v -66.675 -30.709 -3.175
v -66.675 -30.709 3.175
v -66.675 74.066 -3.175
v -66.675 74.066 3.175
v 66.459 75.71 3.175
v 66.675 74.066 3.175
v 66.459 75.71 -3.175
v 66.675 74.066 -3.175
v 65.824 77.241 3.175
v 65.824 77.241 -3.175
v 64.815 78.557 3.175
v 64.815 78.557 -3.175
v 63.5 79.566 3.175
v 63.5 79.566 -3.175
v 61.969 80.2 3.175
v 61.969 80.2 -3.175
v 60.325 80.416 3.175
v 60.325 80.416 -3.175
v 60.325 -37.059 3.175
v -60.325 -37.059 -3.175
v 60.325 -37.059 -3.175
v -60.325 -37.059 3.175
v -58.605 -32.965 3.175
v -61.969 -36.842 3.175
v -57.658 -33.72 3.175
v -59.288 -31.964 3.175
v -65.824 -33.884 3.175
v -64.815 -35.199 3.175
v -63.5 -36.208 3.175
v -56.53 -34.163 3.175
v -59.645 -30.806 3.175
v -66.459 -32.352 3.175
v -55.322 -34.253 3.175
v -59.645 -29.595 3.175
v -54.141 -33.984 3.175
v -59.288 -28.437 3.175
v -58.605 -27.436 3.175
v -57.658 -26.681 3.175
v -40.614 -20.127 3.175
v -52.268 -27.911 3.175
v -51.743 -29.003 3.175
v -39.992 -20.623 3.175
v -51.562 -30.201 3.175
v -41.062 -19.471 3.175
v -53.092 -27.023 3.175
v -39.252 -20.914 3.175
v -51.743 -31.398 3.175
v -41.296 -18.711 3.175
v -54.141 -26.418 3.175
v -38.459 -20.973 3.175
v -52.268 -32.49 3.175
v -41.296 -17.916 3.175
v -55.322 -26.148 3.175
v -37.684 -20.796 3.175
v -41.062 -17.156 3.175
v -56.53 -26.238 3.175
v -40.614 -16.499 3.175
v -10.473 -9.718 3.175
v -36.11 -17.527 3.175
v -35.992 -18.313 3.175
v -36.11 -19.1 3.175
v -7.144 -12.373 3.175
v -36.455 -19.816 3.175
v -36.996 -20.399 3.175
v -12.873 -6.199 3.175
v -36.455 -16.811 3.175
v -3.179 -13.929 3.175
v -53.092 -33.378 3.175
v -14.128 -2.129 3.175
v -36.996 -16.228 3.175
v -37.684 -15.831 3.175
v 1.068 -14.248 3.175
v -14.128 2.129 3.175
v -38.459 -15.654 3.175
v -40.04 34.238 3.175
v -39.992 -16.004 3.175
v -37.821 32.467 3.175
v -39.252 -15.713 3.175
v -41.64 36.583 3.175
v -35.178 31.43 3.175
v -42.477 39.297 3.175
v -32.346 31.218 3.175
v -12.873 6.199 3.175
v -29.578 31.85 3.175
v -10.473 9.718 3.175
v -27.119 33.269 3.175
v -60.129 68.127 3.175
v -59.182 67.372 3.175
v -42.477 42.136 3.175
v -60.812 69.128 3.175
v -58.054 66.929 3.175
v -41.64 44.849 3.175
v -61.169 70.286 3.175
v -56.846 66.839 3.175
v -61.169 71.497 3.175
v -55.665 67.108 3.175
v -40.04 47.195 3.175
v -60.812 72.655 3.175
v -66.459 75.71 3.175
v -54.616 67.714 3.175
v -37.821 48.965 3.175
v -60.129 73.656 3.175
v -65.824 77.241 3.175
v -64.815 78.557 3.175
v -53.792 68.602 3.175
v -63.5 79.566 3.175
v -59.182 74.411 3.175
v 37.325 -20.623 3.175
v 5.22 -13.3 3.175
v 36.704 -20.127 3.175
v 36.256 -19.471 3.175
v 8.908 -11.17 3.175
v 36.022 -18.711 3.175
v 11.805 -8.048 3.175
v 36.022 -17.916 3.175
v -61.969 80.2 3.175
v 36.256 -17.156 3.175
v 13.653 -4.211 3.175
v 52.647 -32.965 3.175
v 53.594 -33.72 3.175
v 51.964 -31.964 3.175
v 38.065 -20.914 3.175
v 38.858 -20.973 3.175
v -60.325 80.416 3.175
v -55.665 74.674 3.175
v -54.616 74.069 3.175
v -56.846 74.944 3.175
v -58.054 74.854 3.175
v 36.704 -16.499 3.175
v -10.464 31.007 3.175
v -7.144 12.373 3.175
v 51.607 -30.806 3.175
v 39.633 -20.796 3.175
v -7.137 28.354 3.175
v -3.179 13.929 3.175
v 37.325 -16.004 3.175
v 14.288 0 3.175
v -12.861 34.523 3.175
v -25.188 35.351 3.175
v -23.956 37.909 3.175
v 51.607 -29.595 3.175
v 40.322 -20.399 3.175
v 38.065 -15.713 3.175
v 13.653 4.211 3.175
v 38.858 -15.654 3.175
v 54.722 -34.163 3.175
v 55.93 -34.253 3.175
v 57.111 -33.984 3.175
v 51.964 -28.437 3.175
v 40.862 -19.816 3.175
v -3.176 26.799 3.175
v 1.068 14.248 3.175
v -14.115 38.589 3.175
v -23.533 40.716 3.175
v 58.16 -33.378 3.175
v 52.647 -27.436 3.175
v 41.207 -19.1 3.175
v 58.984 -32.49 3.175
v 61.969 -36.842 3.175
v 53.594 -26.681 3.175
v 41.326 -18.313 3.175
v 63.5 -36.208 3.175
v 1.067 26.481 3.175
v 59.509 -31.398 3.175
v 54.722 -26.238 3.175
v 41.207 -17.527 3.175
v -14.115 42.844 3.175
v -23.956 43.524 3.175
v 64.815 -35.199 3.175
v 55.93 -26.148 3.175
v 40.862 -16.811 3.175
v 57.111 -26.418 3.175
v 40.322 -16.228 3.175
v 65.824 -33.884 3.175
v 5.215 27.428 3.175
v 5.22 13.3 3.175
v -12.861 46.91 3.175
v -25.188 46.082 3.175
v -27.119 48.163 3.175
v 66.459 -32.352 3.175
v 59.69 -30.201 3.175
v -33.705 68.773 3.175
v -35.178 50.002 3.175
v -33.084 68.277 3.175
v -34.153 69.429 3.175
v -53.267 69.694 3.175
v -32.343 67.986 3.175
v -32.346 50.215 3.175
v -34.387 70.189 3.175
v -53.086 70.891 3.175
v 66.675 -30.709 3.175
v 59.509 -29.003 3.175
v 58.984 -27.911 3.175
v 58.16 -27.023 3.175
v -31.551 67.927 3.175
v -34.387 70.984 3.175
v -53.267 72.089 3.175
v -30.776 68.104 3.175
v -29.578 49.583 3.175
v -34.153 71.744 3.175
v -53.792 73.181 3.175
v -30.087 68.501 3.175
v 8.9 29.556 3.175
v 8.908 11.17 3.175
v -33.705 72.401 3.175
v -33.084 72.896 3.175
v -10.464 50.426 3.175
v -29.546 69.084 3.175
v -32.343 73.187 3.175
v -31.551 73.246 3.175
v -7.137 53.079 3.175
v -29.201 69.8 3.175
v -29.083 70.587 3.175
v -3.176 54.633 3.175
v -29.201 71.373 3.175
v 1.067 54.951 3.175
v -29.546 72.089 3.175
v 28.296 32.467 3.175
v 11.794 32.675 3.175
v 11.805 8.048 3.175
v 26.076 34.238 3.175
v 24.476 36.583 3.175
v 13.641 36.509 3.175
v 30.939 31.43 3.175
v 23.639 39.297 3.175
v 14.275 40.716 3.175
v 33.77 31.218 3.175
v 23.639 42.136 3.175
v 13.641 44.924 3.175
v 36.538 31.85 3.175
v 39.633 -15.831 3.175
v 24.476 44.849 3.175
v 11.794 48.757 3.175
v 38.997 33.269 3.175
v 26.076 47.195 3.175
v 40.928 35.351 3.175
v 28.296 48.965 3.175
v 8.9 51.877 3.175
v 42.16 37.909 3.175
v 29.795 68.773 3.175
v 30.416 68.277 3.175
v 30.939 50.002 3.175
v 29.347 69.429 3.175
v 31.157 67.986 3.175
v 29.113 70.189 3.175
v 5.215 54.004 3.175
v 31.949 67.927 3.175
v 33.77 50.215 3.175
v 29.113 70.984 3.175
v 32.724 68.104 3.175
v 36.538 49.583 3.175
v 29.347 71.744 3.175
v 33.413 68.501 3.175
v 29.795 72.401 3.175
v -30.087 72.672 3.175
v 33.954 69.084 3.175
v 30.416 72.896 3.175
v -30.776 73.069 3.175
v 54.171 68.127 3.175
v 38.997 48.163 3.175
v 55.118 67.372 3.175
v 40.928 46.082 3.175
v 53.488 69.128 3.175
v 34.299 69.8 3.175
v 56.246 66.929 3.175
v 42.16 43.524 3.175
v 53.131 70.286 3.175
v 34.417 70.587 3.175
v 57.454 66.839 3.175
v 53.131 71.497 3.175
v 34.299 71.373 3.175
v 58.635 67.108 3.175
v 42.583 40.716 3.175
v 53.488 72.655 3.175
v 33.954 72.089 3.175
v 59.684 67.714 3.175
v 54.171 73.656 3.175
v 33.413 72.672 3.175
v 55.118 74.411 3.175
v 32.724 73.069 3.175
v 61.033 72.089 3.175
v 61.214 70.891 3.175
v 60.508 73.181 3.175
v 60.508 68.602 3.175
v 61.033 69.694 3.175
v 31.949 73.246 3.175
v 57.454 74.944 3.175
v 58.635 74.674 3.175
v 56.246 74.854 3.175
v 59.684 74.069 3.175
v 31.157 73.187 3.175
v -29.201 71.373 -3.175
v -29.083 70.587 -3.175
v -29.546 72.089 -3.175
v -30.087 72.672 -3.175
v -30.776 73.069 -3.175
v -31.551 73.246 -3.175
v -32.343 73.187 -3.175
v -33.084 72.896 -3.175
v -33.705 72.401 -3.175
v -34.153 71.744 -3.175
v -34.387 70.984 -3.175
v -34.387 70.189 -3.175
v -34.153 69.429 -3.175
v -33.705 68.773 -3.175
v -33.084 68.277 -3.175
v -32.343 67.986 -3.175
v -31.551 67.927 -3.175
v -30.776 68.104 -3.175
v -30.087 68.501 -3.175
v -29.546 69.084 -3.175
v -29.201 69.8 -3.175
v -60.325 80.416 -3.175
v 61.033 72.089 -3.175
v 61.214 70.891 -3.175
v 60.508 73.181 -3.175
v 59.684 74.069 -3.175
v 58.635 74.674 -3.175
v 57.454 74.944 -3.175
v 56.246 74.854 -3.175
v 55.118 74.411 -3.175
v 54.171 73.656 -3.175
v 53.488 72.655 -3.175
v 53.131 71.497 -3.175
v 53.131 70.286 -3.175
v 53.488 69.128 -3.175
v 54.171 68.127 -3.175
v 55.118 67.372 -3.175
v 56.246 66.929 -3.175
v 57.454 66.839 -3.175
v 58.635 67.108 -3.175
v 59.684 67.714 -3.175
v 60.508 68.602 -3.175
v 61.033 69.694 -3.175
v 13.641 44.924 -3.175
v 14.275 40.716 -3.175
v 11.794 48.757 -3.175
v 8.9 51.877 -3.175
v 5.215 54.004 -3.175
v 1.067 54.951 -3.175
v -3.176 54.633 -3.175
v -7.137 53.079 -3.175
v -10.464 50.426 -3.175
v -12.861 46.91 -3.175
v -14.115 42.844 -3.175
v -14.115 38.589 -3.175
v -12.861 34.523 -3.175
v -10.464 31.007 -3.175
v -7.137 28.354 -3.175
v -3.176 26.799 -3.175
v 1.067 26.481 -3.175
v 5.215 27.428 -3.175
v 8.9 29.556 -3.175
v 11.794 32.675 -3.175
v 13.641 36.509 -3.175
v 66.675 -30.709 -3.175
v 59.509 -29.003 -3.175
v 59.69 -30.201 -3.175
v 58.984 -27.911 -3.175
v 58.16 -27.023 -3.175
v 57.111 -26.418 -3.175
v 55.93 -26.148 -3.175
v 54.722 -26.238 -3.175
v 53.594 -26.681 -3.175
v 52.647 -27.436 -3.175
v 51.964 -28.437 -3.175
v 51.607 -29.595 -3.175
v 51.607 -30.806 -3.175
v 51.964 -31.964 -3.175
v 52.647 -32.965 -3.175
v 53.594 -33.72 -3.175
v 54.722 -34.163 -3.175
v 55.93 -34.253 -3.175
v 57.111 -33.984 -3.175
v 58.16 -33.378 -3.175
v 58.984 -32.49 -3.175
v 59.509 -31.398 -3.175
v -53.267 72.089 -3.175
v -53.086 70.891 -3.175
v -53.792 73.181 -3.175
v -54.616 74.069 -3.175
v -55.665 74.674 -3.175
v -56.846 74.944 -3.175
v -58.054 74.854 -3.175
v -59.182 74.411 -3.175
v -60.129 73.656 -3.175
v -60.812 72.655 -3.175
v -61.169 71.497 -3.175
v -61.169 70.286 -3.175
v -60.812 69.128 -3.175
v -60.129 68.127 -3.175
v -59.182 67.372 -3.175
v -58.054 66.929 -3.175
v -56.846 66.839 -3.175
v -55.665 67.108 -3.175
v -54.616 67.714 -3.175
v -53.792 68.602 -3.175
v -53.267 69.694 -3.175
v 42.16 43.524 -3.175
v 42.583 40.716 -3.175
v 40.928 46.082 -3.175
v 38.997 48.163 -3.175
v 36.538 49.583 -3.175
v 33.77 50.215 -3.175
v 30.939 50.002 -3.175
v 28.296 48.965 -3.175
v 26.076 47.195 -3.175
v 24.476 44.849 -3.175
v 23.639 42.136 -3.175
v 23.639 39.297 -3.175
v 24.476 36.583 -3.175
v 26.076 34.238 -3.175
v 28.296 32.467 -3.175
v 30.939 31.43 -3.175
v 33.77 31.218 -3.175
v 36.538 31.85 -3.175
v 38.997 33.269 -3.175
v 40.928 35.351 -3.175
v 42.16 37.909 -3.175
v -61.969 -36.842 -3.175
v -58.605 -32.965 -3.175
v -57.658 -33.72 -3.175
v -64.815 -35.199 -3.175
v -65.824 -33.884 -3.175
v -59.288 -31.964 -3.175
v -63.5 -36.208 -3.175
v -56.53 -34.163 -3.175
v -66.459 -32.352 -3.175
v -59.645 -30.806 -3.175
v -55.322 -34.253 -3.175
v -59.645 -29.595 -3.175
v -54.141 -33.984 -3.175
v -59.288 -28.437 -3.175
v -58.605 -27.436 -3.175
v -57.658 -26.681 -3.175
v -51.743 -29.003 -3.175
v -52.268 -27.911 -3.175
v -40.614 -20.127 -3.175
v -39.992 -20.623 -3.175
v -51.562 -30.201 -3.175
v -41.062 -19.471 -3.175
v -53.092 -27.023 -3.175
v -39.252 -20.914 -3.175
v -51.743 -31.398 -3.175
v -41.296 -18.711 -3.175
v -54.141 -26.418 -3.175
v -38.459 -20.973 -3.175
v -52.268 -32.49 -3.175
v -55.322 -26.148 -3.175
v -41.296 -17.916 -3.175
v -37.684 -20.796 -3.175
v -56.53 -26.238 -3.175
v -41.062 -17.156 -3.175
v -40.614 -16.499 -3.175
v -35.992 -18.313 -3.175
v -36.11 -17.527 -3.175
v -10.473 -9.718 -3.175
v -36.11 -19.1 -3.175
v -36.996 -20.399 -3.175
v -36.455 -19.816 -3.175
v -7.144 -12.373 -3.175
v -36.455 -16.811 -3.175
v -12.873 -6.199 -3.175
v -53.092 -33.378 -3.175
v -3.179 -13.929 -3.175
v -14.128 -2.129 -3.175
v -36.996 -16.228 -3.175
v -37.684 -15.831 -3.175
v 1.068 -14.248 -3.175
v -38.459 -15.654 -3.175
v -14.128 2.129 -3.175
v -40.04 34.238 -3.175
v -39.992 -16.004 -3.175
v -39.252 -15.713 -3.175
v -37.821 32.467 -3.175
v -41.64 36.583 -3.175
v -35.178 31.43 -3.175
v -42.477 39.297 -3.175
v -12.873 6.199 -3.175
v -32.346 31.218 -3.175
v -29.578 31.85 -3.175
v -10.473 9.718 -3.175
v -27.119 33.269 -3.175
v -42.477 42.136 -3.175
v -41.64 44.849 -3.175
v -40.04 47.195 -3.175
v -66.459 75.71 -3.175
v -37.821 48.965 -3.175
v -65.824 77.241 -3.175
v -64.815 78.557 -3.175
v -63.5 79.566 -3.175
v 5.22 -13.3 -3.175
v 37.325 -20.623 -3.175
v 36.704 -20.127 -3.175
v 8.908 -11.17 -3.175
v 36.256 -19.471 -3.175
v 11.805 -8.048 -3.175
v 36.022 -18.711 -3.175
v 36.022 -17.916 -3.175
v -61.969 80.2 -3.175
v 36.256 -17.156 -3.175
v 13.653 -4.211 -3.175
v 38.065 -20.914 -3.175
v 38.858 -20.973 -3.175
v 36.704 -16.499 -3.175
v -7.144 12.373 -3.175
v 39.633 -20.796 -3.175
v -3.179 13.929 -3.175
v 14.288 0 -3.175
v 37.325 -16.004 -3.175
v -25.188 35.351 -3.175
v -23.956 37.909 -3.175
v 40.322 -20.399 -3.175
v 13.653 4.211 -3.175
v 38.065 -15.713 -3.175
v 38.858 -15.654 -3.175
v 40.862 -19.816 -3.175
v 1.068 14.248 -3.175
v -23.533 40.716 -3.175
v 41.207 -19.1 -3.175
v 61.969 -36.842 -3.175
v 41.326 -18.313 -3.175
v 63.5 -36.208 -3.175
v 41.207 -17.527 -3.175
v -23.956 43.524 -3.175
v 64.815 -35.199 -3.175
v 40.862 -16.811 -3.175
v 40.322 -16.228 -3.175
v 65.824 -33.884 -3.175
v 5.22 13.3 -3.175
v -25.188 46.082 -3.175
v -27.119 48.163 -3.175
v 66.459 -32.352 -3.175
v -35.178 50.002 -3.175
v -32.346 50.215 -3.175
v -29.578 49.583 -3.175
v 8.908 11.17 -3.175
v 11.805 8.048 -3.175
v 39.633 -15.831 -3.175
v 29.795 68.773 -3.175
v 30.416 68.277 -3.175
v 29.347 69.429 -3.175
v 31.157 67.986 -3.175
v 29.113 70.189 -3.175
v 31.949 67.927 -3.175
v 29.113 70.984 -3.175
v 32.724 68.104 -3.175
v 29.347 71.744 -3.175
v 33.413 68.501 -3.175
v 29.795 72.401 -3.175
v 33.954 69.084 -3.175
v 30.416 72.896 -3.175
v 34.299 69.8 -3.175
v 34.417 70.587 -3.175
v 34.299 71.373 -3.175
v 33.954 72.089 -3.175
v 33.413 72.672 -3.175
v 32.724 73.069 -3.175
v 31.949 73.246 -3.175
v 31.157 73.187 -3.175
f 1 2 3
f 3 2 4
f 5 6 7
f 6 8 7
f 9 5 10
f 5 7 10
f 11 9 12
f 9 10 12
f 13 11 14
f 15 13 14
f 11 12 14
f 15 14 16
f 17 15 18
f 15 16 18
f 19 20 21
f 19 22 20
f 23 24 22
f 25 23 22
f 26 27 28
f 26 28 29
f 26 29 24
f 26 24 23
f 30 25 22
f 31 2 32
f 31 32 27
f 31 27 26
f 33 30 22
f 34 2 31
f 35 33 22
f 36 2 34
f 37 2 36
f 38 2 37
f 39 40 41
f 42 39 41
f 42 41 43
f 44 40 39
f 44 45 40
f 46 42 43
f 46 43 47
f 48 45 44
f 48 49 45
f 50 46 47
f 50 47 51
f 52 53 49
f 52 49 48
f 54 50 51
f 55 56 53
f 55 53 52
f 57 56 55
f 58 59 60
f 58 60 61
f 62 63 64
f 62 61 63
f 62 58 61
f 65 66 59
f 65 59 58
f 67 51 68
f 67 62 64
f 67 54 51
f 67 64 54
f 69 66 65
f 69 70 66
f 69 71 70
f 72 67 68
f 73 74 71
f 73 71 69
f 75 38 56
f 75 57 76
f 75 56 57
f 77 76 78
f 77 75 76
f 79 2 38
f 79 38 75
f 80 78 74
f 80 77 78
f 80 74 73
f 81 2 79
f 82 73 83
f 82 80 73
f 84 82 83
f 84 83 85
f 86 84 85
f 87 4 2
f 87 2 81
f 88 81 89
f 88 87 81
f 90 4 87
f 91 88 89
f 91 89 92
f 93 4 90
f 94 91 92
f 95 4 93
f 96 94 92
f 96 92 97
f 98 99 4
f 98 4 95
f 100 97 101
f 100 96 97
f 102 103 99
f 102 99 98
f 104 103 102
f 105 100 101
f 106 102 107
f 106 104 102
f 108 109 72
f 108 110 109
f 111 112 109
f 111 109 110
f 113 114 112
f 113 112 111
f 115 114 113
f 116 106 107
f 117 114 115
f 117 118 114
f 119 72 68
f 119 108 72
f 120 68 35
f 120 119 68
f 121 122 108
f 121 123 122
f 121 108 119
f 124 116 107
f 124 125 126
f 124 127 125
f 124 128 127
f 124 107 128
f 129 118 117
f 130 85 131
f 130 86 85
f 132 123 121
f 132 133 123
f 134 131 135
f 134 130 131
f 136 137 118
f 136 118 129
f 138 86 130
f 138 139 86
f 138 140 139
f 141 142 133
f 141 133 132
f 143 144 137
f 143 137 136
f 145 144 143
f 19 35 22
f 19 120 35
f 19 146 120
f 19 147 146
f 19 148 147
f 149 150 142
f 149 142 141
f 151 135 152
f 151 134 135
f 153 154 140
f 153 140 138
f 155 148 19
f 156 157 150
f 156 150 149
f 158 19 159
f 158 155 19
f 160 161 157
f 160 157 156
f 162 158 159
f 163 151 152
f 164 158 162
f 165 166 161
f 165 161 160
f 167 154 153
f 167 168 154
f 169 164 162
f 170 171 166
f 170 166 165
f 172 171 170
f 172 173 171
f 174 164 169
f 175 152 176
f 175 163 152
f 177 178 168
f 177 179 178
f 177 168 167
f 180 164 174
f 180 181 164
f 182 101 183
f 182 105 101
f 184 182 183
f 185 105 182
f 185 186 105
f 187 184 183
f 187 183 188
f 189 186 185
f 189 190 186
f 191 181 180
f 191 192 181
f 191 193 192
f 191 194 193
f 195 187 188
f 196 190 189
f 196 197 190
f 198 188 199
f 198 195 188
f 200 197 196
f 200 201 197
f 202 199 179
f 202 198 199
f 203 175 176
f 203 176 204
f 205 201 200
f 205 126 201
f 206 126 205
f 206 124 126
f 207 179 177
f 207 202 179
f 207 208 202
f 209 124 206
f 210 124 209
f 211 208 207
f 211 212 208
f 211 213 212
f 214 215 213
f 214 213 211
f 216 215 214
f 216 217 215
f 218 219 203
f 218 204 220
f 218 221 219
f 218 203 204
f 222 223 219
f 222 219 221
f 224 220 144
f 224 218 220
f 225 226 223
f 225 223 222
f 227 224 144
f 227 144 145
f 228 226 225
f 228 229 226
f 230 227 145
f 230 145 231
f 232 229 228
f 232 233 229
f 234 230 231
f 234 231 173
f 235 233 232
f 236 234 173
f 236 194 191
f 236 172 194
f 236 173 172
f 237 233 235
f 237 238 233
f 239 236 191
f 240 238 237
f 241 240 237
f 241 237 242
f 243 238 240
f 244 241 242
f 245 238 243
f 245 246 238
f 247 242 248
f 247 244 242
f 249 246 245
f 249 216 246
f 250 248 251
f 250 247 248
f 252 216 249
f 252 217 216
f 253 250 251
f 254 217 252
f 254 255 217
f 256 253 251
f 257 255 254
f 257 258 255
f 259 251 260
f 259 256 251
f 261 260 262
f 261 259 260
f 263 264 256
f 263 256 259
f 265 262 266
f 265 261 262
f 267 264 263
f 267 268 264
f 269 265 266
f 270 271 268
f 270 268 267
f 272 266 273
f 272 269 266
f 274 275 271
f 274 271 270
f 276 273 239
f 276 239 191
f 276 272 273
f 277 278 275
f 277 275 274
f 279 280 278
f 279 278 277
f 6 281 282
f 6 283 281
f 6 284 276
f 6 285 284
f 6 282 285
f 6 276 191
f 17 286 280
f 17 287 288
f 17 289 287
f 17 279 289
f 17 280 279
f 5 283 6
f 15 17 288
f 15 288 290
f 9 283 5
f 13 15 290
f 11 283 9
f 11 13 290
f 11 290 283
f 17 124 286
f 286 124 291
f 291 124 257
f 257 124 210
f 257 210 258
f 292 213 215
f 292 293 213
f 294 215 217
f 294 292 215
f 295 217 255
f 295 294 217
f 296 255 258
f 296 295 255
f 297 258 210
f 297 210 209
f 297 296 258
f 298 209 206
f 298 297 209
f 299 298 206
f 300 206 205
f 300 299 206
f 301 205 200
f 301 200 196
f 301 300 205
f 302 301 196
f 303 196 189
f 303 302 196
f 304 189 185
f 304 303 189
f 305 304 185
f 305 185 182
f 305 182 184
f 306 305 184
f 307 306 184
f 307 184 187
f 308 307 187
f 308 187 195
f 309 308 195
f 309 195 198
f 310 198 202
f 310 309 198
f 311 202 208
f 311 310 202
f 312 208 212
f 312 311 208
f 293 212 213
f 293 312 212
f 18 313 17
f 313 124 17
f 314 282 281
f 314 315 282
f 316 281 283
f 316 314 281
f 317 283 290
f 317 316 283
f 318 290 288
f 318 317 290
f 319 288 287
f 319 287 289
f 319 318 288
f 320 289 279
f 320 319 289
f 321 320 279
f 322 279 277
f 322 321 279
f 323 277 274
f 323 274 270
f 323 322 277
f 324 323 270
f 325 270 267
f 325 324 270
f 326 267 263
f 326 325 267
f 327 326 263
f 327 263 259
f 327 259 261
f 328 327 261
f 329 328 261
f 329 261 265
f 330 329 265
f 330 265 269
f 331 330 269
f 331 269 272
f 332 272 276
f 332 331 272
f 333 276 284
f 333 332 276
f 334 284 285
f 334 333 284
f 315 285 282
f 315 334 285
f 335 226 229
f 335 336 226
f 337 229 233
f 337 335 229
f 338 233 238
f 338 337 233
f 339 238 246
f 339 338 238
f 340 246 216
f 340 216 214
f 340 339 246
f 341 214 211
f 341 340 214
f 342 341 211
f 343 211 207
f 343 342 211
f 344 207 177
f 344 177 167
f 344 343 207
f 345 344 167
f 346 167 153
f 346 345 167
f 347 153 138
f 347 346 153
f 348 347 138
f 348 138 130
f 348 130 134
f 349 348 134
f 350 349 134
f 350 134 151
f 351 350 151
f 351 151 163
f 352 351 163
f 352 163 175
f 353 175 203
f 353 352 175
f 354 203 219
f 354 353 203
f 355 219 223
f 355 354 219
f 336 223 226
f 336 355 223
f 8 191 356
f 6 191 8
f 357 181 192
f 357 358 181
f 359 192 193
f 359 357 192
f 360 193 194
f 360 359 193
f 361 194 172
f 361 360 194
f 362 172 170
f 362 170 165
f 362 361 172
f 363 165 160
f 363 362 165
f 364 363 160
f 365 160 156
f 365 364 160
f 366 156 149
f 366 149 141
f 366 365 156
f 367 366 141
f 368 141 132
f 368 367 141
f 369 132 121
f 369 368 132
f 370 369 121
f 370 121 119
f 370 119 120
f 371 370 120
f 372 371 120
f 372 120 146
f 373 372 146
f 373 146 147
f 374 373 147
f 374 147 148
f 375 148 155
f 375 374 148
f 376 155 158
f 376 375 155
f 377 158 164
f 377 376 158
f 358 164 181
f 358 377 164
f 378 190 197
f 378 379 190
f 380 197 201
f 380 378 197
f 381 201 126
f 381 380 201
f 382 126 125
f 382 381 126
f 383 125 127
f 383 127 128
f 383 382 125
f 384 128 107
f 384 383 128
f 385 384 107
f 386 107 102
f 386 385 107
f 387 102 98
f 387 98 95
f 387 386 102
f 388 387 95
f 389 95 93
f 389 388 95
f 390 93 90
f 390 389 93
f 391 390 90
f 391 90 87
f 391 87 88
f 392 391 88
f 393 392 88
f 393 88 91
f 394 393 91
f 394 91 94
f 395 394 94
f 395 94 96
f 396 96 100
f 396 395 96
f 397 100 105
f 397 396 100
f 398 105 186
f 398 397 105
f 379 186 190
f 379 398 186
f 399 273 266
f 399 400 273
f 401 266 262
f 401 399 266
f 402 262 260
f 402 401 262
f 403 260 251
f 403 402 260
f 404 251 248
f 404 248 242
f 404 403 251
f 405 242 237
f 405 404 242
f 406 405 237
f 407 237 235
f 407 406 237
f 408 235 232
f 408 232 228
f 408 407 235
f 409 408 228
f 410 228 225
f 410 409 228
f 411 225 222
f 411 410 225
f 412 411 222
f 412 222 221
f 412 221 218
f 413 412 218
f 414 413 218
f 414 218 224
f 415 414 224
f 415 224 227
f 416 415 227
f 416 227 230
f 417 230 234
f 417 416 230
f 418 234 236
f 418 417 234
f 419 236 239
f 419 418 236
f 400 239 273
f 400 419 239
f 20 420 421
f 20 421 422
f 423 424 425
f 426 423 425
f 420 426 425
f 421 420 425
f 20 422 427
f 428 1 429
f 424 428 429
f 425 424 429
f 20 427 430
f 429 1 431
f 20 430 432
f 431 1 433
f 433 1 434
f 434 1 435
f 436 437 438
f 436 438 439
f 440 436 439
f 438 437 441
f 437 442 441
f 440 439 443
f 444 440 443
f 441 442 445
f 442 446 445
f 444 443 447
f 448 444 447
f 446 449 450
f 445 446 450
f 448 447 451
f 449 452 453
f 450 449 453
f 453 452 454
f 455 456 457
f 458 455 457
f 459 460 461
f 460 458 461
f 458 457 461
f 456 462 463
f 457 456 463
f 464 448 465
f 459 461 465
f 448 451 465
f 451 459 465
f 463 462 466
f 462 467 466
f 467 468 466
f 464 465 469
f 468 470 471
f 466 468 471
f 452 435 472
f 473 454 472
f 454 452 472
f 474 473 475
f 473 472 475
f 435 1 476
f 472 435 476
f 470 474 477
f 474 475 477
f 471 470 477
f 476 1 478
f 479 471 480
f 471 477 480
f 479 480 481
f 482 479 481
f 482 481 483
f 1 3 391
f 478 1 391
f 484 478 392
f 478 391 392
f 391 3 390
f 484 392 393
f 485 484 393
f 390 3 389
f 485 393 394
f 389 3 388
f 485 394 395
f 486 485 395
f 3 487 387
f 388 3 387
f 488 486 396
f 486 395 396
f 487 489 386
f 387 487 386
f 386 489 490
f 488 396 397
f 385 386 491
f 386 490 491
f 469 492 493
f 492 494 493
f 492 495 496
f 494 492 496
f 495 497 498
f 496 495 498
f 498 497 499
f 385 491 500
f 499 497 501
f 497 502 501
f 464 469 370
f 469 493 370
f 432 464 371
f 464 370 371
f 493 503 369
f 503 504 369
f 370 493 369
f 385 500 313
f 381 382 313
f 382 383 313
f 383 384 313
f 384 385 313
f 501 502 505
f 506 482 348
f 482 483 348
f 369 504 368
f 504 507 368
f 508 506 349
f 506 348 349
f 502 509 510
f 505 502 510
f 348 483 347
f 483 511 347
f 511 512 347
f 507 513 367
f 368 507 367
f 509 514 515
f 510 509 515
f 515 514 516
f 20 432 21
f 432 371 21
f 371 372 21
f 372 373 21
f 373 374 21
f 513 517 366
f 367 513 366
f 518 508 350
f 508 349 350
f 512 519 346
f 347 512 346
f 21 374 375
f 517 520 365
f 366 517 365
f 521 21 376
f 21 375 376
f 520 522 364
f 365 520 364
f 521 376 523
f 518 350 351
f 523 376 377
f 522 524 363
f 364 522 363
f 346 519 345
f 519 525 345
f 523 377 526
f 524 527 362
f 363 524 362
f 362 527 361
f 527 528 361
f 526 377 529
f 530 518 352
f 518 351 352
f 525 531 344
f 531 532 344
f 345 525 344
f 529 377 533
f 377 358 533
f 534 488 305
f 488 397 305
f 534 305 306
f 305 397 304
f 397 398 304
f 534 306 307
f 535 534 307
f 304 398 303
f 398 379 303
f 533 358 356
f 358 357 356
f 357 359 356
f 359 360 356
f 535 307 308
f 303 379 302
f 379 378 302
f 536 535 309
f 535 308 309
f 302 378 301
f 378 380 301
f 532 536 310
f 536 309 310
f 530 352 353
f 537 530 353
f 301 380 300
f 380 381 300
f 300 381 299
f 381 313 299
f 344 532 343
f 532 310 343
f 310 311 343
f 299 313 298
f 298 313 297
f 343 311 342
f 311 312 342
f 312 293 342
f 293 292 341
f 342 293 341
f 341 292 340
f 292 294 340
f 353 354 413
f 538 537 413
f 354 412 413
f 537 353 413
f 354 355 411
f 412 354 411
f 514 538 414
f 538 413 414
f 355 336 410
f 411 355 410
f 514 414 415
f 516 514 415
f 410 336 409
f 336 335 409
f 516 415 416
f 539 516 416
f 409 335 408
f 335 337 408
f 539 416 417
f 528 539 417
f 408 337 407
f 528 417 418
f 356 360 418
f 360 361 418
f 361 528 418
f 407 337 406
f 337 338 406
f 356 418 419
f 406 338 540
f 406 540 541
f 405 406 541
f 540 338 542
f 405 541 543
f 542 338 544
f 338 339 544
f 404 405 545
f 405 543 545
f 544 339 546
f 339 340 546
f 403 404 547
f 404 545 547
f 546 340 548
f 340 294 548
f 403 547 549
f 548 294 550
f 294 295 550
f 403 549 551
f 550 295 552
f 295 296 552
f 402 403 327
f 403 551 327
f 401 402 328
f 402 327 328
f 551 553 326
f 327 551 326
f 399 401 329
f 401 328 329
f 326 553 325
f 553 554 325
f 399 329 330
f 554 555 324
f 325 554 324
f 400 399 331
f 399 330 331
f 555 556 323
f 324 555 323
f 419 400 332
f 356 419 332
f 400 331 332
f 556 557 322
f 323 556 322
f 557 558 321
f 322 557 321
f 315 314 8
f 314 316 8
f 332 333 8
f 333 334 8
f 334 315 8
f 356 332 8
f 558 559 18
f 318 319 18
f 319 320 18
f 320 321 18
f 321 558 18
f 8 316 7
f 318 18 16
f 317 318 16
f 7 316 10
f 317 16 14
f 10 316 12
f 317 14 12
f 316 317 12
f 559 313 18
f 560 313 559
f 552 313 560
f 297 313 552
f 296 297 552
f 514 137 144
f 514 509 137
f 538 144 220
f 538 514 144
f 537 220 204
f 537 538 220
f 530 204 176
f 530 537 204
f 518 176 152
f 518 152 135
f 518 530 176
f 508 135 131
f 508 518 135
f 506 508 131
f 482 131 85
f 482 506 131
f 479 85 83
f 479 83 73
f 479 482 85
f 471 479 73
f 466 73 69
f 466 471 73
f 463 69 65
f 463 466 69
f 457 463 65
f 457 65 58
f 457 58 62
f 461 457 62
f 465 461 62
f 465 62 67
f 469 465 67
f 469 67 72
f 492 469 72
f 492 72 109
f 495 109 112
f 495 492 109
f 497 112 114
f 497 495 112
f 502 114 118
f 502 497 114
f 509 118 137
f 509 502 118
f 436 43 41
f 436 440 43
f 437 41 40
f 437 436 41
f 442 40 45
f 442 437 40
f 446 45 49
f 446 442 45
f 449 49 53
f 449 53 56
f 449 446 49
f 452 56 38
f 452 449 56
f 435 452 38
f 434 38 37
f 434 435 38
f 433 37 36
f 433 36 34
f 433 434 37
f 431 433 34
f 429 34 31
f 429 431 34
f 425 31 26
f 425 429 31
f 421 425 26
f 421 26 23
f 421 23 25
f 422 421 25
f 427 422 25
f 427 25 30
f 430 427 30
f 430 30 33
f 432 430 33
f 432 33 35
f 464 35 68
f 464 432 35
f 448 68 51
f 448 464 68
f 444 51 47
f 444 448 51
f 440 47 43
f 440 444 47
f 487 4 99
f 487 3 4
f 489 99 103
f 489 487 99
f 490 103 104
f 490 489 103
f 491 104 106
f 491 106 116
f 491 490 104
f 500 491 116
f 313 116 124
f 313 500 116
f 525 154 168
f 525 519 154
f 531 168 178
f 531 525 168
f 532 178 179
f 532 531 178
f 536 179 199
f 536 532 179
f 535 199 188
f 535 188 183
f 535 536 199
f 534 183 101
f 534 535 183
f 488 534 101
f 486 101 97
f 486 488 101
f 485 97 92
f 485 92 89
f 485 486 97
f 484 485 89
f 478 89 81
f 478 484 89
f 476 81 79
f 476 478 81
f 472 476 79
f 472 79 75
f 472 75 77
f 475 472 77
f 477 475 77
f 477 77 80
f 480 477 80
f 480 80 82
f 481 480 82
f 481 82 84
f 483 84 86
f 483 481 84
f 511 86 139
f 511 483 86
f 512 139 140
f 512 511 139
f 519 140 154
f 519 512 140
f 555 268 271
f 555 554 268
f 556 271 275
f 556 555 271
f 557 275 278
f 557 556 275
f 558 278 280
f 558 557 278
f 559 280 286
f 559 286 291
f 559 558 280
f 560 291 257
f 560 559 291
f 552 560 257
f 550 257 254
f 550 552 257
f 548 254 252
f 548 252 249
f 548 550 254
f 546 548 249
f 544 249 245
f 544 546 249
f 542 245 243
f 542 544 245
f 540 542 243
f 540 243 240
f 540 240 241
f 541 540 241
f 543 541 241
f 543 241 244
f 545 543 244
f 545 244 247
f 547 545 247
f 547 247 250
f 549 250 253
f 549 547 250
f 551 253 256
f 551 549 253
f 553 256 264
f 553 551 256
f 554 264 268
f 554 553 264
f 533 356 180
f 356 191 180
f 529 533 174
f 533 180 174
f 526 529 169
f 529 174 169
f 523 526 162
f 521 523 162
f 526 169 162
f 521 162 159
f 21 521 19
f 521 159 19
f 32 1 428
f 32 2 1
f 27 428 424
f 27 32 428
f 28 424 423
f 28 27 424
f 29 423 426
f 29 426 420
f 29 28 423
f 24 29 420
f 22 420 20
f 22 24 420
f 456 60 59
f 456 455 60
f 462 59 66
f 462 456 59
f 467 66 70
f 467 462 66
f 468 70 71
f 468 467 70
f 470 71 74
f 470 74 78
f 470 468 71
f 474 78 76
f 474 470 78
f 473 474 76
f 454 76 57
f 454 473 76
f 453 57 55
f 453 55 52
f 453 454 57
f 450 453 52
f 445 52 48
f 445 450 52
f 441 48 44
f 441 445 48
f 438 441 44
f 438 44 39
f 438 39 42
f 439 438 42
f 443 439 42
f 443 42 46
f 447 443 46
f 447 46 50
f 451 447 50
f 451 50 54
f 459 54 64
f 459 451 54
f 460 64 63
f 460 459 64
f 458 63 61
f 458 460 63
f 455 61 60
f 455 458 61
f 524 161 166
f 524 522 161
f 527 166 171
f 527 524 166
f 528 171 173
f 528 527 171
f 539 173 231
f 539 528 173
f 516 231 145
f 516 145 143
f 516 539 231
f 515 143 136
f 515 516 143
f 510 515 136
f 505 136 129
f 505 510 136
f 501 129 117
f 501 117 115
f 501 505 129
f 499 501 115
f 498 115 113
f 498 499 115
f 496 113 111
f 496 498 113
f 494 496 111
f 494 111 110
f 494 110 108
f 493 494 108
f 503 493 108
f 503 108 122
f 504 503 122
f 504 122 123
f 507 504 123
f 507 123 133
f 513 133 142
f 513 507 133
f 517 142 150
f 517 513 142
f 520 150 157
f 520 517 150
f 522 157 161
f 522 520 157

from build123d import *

# Parameters (mm, degrees)
SKETCH1_W           = 133.35
SKETCH1_H           = 117.475
SKETCH1_R           = 14.2748
SKETCH1_R_2         = 9.525
SKETCH1_R_3         = 14.2875
SKETCH1_R_4         = 4.064
SKETCH1_R_5         = 2.667
BOSS_EXTRUDE1_DEPTH = 3.175
FILLET1_R           = 6.35


with BuildPart() as part:
    # Sketch1 → Boss-Extrude1 (new, symmetric)
    with BuildSketch(Plane.XY):
        with Locations((0, 21.6789)):
            Rectangle(SKETCH1_W, SKETCH1_H)
        with Locations((0, 40.7162)):
            Circle(SKETCH1_R, mode=Mode.SUBTRACT)
        with Locations((33.0581, 40.7162)):
            Circle(SKETCH1_R_2, mode=Mode.SUBTRACT)
        with Locations((-33.0581, 40.7162)):
            Circle(SKETCH1_R_2, mode=Mode.SUBTRACT)
        Circle(SKETCH1_R_3, mode=Mode.SUBTRACT)
        with Locations((-57.15, 70.8914)):
            Circle(SKETCH1_R_4, mode=Mode.SUBTRACT)
        with Locations((-55.626, -30.2006)):
            Circle(SKETCH1_R_4, mode=Mode.SUBTRACT)
        with Locations((57.15, 70.8914)):
            Circle(SKETCH1_R_4, mode=Mode.SUBTRACT)
        with Locations((55.626, -30.2006)):
            Circle(SKETCH1_R_4, mode=Mode.SUBTRACT)
        with Locations((38.6588, -18.3134)):
            Circle(SKETCH1_R_5, mode=Mode.SUBTRACT)
        with Locations((-38.6588, -18.3134)):
            Circle(SKETCH1_R_5, mode=Mode.SUBTRACT)
        with Locations((-31.75, 70.5866)):
            Circle(SKETCH1_R_5, mode=Mode.SUBTRACT)
        with Locations((31.75, 70.5866)):
            Circle(SKETCH1_R_5, mode=Mode.SUBTRACT)
    extrude(amount=BOSS_EXTRUDE1_DEPTH, both=True)

    # Fillet1
    fillet1_edges = [part.edges().sort_by_distance(p)[0] for p in [
        (66.675, -37.0586, 0),
        (-66.675, -37.0586, 0),
        (-66.675, 80.4164, 0),
        (66.675, 80.4164, 0),
    ]]
    fillet(fillet1_edges, radius=FILLET1_R)


solid = part.part
